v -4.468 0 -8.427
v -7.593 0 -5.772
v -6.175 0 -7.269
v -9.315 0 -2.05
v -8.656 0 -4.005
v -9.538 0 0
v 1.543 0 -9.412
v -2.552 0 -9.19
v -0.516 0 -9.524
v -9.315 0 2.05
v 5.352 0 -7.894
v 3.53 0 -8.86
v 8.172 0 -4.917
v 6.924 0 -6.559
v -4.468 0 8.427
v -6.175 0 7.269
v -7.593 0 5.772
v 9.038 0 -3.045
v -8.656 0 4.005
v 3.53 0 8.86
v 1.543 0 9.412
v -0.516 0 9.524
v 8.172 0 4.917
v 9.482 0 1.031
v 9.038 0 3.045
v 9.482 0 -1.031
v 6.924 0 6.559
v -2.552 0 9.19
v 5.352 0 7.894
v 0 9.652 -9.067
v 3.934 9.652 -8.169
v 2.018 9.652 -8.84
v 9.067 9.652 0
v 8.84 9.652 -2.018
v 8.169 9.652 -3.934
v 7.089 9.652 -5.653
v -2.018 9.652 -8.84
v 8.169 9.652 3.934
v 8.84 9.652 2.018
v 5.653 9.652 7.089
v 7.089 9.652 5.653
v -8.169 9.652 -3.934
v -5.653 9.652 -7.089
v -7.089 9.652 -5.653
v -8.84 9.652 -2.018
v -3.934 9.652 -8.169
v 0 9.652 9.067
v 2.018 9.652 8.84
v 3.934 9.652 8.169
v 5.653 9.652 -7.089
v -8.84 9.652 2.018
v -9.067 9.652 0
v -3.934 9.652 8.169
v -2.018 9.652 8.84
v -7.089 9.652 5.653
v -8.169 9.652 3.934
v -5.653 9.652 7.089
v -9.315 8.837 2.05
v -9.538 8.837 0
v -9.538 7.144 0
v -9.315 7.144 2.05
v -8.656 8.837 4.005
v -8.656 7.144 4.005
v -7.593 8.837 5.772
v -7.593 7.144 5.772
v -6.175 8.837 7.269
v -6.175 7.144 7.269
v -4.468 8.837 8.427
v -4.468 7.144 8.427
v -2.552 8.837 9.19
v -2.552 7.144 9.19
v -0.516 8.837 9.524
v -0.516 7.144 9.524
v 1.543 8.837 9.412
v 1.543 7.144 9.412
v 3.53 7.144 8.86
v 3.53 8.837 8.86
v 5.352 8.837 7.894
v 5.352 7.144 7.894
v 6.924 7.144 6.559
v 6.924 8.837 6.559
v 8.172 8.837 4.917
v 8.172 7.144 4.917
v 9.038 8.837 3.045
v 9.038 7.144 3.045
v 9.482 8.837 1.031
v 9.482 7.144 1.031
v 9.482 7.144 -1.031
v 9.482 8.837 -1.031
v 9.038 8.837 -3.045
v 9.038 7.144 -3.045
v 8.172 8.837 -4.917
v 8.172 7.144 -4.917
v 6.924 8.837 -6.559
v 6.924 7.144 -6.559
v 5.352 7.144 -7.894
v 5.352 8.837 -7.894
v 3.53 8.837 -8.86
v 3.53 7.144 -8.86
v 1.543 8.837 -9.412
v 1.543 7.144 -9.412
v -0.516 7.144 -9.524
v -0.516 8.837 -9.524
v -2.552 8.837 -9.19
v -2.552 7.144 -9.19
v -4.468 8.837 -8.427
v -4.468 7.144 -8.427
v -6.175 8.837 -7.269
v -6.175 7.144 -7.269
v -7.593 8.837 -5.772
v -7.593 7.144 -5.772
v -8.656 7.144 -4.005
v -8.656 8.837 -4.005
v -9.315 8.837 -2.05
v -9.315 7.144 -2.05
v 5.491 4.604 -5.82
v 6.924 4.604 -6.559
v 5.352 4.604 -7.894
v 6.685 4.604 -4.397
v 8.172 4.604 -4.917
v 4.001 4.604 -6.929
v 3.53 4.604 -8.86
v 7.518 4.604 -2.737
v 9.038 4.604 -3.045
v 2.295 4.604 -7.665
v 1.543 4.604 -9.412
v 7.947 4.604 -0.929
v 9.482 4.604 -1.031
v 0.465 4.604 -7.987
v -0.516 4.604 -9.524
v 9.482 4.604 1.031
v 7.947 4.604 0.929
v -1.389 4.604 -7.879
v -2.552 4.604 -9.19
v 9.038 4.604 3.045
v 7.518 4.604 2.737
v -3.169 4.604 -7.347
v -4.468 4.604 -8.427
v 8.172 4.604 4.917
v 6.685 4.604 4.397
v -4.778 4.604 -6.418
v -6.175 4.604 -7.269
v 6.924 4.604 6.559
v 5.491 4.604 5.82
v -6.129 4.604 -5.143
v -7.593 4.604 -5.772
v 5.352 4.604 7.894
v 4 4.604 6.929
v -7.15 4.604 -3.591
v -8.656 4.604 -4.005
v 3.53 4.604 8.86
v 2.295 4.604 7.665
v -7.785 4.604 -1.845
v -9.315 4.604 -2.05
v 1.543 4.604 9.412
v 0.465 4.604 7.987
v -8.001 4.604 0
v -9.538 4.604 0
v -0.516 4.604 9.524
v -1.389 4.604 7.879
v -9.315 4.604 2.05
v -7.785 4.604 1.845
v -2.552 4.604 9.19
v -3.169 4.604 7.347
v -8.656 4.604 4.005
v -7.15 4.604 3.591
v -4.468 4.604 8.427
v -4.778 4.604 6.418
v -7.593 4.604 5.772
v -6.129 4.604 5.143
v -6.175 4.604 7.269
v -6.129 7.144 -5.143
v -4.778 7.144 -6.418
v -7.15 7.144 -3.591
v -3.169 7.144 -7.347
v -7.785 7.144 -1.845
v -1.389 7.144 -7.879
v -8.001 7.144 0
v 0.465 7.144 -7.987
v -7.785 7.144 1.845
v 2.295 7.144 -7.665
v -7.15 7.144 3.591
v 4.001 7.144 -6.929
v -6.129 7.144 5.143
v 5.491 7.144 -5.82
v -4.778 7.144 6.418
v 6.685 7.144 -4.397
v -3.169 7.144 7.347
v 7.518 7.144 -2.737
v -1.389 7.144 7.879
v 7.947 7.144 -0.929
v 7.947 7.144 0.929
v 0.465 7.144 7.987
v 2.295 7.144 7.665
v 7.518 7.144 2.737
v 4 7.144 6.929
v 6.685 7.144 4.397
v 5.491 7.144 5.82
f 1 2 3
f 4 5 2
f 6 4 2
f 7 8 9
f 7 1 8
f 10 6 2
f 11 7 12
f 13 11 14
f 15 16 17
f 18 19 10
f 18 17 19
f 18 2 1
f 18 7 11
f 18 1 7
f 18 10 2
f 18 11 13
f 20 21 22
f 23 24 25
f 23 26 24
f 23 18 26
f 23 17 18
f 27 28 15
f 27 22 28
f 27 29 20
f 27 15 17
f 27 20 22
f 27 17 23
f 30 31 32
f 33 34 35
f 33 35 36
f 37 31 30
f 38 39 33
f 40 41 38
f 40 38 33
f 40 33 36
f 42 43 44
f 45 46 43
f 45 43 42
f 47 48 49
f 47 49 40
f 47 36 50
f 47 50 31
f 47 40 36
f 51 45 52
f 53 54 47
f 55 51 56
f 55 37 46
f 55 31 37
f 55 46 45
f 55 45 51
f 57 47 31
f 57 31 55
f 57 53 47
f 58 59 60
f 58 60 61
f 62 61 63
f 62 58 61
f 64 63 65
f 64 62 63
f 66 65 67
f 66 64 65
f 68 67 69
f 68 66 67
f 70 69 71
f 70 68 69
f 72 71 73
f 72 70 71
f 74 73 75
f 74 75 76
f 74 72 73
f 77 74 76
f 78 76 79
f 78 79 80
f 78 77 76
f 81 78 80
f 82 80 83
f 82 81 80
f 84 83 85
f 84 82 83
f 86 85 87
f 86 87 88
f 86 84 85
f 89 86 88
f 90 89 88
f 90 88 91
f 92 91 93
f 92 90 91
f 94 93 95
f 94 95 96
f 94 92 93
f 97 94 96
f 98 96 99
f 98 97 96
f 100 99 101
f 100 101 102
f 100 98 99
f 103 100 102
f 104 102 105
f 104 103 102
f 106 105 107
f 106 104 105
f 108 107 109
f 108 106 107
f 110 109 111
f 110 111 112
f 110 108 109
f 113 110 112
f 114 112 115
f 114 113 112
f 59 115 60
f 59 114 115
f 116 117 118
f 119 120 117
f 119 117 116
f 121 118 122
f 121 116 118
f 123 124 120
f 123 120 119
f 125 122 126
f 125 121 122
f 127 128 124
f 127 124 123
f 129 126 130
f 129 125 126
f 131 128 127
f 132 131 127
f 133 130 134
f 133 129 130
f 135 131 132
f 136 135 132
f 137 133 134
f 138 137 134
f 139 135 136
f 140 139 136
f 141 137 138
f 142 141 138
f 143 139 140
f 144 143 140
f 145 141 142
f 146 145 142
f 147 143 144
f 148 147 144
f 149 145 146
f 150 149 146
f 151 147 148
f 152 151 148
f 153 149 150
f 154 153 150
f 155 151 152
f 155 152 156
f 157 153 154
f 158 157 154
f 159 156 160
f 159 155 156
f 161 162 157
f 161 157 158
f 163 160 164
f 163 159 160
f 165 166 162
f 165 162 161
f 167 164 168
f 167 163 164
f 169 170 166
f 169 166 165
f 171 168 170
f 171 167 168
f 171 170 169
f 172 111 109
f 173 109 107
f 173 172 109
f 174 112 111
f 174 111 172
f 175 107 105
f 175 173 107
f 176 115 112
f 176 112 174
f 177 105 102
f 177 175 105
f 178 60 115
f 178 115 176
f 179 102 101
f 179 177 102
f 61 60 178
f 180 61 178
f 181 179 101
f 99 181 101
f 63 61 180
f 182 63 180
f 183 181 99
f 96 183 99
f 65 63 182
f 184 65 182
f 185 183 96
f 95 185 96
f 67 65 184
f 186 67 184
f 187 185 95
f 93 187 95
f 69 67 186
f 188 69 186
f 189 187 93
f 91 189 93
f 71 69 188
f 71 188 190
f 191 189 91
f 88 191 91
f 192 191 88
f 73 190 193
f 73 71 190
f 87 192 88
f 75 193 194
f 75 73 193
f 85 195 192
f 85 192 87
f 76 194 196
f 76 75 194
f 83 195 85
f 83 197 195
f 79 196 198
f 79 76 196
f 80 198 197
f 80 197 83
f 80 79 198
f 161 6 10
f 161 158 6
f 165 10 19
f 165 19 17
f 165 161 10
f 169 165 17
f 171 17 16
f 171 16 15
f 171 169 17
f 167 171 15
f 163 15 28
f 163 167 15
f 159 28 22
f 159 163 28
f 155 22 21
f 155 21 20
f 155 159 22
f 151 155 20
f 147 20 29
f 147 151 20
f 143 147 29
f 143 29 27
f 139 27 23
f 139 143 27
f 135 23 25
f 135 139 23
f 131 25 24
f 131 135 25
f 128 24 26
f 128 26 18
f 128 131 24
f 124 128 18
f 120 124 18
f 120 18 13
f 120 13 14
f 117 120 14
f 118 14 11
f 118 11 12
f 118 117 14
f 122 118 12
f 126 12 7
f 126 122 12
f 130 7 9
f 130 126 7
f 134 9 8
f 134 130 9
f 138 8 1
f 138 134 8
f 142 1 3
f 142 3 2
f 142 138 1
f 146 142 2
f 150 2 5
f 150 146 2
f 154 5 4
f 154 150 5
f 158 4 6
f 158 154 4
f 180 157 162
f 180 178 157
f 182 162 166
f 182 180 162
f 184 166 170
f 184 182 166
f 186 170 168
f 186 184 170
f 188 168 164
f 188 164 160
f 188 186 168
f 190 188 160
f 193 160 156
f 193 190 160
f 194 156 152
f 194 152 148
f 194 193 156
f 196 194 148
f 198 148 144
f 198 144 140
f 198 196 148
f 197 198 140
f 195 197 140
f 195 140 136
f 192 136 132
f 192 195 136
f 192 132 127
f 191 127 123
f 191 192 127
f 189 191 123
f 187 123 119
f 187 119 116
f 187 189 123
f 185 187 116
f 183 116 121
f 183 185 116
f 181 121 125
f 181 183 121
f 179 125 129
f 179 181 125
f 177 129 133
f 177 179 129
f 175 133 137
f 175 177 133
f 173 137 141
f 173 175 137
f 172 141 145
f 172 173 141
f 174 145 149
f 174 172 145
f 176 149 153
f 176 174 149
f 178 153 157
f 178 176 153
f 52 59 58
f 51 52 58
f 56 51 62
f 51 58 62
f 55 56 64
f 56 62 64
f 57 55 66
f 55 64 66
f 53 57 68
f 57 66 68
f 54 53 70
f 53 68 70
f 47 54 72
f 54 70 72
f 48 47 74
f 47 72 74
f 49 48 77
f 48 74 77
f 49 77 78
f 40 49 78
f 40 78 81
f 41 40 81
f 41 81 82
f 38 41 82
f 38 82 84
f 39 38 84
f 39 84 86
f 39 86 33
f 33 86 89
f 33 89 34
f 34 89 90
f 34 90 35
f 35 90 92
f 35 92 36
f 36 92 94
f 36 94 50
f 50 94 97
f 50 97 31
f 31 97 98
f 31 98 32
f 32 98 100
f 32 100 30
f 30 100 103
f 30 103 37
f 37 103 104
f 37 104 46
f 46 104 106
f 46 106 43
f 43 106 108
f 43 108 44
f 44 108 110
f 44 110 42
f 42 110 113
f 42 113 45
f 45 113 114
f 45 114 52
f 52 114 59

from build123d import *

# Parameters (mm, degrees)
CHAMFER1_SIZE  = 0.47037037
CHAMFER1_SIZE2 = 0.81470538


with BuildPart() as part:
    # Sketch1 → Revolve1 (revolve)
    with BuildSketch(Plane.XY):
        Polygon((0, 0), (-9.5377, 0), (-9.5377, 4.60375), (-8.001, 4.60375), (-8.001, 7.14375), (-9.5377, 7.14375), (-9.5377, 9.652), (0, 9.652), align=None)
    revolve(axis=Axis((0, 0, 0), (0, 1, 0)))

    # Chamfer1
    chamfer1_edges = [part.edges().sort_by_distance(p)[0] for p in [
        (9.5377, 9.652, 0),
    ]]
    chamfer1_side = [part.faces().sort_by_distance(p)[0] for p in [
        (0, 9.652, 0),
    ]]
    chamfer(chamfer1_edges, length=CHAMFER1_SIZE, length2=CHAMFER1_SIZE2, reference=chamfer1_side[0])


solid = part.part
